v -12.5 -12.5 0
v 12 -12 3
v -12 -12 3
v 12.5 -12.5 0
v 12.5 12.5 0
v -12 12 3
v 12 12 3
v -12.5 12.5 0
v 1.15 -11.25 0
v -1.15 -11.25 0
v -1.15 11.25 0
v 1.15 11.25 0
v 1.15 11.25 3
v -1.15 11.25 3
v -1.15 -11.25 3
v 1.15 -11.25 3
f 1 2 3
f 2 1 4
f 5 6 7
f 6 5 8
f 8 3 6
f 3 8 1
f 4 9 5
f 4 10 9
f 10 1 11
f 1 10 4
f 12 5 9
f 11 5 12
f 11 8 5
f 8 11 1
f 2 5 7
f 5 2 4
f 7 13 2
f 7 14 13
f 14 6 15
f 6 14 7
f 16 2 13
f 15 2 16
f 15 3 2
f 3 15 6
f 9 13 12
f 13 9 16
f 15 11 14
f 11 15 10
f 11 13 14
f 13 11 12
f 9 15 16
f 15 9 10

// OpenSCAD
// Base generator and customizer script
// developed by Daniel Joyce
// 3D-Miniatures.com

/* [Global] */

// Polygon
base_style = 4; // [3:triangle,4:square,5:pentagon,6:hexagon,7:heptagon,8:octagon,50:round]

// Base diameter, 
diameter = 25; // [15:250]

// Thickness of base, ~3 mm is std
thickness = 3; // [1:25]

// Should base have a slot
slot = 1; // [1:yes, 2:no]

// Orientation of slot
slot_orientation = 1; // [1:sides, 2:verts]

// Normally 25 mm square / hex base diameter is measured side to side
across_sides = 1; // [0:no, 1:yes]

// Number of rows of bases
rows = 1; // [1:10]

// Number of columns of bases
columns = 1; // [1:10]


/* [Hidden] */

radius = diameter / 2;

cos_r = cos(360/(2*base_style));

scale_factor = across_sides == 0 ? 1 : 1 / cos_r;

offset = (diameter * scale_factor) + 2;

module base(sides, 
	diameter = 25, 
	slot = false, 
	height = 3.33,
	slot_x = true,
	inset = false ){
	radius = diameter / 2;
	cos_r = cos(360/(2*sides));

	scale_factor = inset ? 1 : 1 / cos_r;
	slot_width = cos(360/(2*sides))*diameter*0.9*scale_factor;
	even = sides % 2 == 0;
	slot_angle = even ? 360 / (2*sides) : 90;
	slot_r = slot_x ? 0 : slot_angle;
	difference(){
		scale([scale_factor,scale_factor,1]) rotate([0,0,360/(2*sides)]) cylinder(h = height, r1=radius, r2=radius-0.5, $fn=sides);
		if(slot){
			rotate([0,0, slot_r]) cube([2.3,slot_width,height+10], center=true);
		}
	}
}

module make_x_by_y(x,y,offset){
	for(j = [0:y]){
		for(i = [0:x]){
			translate([i*offset,j*offset,0]) child(0);
		}
	}
	
}

make_x_by_y(rows - 1,columns - 1,offset){
	base(base_style, 
		diameter = diameter, 
		slot = (slot==1),
		height = thickness,
		inset = (across_sides == 0),
		slot_x = (slot_orientation==1) );
}
